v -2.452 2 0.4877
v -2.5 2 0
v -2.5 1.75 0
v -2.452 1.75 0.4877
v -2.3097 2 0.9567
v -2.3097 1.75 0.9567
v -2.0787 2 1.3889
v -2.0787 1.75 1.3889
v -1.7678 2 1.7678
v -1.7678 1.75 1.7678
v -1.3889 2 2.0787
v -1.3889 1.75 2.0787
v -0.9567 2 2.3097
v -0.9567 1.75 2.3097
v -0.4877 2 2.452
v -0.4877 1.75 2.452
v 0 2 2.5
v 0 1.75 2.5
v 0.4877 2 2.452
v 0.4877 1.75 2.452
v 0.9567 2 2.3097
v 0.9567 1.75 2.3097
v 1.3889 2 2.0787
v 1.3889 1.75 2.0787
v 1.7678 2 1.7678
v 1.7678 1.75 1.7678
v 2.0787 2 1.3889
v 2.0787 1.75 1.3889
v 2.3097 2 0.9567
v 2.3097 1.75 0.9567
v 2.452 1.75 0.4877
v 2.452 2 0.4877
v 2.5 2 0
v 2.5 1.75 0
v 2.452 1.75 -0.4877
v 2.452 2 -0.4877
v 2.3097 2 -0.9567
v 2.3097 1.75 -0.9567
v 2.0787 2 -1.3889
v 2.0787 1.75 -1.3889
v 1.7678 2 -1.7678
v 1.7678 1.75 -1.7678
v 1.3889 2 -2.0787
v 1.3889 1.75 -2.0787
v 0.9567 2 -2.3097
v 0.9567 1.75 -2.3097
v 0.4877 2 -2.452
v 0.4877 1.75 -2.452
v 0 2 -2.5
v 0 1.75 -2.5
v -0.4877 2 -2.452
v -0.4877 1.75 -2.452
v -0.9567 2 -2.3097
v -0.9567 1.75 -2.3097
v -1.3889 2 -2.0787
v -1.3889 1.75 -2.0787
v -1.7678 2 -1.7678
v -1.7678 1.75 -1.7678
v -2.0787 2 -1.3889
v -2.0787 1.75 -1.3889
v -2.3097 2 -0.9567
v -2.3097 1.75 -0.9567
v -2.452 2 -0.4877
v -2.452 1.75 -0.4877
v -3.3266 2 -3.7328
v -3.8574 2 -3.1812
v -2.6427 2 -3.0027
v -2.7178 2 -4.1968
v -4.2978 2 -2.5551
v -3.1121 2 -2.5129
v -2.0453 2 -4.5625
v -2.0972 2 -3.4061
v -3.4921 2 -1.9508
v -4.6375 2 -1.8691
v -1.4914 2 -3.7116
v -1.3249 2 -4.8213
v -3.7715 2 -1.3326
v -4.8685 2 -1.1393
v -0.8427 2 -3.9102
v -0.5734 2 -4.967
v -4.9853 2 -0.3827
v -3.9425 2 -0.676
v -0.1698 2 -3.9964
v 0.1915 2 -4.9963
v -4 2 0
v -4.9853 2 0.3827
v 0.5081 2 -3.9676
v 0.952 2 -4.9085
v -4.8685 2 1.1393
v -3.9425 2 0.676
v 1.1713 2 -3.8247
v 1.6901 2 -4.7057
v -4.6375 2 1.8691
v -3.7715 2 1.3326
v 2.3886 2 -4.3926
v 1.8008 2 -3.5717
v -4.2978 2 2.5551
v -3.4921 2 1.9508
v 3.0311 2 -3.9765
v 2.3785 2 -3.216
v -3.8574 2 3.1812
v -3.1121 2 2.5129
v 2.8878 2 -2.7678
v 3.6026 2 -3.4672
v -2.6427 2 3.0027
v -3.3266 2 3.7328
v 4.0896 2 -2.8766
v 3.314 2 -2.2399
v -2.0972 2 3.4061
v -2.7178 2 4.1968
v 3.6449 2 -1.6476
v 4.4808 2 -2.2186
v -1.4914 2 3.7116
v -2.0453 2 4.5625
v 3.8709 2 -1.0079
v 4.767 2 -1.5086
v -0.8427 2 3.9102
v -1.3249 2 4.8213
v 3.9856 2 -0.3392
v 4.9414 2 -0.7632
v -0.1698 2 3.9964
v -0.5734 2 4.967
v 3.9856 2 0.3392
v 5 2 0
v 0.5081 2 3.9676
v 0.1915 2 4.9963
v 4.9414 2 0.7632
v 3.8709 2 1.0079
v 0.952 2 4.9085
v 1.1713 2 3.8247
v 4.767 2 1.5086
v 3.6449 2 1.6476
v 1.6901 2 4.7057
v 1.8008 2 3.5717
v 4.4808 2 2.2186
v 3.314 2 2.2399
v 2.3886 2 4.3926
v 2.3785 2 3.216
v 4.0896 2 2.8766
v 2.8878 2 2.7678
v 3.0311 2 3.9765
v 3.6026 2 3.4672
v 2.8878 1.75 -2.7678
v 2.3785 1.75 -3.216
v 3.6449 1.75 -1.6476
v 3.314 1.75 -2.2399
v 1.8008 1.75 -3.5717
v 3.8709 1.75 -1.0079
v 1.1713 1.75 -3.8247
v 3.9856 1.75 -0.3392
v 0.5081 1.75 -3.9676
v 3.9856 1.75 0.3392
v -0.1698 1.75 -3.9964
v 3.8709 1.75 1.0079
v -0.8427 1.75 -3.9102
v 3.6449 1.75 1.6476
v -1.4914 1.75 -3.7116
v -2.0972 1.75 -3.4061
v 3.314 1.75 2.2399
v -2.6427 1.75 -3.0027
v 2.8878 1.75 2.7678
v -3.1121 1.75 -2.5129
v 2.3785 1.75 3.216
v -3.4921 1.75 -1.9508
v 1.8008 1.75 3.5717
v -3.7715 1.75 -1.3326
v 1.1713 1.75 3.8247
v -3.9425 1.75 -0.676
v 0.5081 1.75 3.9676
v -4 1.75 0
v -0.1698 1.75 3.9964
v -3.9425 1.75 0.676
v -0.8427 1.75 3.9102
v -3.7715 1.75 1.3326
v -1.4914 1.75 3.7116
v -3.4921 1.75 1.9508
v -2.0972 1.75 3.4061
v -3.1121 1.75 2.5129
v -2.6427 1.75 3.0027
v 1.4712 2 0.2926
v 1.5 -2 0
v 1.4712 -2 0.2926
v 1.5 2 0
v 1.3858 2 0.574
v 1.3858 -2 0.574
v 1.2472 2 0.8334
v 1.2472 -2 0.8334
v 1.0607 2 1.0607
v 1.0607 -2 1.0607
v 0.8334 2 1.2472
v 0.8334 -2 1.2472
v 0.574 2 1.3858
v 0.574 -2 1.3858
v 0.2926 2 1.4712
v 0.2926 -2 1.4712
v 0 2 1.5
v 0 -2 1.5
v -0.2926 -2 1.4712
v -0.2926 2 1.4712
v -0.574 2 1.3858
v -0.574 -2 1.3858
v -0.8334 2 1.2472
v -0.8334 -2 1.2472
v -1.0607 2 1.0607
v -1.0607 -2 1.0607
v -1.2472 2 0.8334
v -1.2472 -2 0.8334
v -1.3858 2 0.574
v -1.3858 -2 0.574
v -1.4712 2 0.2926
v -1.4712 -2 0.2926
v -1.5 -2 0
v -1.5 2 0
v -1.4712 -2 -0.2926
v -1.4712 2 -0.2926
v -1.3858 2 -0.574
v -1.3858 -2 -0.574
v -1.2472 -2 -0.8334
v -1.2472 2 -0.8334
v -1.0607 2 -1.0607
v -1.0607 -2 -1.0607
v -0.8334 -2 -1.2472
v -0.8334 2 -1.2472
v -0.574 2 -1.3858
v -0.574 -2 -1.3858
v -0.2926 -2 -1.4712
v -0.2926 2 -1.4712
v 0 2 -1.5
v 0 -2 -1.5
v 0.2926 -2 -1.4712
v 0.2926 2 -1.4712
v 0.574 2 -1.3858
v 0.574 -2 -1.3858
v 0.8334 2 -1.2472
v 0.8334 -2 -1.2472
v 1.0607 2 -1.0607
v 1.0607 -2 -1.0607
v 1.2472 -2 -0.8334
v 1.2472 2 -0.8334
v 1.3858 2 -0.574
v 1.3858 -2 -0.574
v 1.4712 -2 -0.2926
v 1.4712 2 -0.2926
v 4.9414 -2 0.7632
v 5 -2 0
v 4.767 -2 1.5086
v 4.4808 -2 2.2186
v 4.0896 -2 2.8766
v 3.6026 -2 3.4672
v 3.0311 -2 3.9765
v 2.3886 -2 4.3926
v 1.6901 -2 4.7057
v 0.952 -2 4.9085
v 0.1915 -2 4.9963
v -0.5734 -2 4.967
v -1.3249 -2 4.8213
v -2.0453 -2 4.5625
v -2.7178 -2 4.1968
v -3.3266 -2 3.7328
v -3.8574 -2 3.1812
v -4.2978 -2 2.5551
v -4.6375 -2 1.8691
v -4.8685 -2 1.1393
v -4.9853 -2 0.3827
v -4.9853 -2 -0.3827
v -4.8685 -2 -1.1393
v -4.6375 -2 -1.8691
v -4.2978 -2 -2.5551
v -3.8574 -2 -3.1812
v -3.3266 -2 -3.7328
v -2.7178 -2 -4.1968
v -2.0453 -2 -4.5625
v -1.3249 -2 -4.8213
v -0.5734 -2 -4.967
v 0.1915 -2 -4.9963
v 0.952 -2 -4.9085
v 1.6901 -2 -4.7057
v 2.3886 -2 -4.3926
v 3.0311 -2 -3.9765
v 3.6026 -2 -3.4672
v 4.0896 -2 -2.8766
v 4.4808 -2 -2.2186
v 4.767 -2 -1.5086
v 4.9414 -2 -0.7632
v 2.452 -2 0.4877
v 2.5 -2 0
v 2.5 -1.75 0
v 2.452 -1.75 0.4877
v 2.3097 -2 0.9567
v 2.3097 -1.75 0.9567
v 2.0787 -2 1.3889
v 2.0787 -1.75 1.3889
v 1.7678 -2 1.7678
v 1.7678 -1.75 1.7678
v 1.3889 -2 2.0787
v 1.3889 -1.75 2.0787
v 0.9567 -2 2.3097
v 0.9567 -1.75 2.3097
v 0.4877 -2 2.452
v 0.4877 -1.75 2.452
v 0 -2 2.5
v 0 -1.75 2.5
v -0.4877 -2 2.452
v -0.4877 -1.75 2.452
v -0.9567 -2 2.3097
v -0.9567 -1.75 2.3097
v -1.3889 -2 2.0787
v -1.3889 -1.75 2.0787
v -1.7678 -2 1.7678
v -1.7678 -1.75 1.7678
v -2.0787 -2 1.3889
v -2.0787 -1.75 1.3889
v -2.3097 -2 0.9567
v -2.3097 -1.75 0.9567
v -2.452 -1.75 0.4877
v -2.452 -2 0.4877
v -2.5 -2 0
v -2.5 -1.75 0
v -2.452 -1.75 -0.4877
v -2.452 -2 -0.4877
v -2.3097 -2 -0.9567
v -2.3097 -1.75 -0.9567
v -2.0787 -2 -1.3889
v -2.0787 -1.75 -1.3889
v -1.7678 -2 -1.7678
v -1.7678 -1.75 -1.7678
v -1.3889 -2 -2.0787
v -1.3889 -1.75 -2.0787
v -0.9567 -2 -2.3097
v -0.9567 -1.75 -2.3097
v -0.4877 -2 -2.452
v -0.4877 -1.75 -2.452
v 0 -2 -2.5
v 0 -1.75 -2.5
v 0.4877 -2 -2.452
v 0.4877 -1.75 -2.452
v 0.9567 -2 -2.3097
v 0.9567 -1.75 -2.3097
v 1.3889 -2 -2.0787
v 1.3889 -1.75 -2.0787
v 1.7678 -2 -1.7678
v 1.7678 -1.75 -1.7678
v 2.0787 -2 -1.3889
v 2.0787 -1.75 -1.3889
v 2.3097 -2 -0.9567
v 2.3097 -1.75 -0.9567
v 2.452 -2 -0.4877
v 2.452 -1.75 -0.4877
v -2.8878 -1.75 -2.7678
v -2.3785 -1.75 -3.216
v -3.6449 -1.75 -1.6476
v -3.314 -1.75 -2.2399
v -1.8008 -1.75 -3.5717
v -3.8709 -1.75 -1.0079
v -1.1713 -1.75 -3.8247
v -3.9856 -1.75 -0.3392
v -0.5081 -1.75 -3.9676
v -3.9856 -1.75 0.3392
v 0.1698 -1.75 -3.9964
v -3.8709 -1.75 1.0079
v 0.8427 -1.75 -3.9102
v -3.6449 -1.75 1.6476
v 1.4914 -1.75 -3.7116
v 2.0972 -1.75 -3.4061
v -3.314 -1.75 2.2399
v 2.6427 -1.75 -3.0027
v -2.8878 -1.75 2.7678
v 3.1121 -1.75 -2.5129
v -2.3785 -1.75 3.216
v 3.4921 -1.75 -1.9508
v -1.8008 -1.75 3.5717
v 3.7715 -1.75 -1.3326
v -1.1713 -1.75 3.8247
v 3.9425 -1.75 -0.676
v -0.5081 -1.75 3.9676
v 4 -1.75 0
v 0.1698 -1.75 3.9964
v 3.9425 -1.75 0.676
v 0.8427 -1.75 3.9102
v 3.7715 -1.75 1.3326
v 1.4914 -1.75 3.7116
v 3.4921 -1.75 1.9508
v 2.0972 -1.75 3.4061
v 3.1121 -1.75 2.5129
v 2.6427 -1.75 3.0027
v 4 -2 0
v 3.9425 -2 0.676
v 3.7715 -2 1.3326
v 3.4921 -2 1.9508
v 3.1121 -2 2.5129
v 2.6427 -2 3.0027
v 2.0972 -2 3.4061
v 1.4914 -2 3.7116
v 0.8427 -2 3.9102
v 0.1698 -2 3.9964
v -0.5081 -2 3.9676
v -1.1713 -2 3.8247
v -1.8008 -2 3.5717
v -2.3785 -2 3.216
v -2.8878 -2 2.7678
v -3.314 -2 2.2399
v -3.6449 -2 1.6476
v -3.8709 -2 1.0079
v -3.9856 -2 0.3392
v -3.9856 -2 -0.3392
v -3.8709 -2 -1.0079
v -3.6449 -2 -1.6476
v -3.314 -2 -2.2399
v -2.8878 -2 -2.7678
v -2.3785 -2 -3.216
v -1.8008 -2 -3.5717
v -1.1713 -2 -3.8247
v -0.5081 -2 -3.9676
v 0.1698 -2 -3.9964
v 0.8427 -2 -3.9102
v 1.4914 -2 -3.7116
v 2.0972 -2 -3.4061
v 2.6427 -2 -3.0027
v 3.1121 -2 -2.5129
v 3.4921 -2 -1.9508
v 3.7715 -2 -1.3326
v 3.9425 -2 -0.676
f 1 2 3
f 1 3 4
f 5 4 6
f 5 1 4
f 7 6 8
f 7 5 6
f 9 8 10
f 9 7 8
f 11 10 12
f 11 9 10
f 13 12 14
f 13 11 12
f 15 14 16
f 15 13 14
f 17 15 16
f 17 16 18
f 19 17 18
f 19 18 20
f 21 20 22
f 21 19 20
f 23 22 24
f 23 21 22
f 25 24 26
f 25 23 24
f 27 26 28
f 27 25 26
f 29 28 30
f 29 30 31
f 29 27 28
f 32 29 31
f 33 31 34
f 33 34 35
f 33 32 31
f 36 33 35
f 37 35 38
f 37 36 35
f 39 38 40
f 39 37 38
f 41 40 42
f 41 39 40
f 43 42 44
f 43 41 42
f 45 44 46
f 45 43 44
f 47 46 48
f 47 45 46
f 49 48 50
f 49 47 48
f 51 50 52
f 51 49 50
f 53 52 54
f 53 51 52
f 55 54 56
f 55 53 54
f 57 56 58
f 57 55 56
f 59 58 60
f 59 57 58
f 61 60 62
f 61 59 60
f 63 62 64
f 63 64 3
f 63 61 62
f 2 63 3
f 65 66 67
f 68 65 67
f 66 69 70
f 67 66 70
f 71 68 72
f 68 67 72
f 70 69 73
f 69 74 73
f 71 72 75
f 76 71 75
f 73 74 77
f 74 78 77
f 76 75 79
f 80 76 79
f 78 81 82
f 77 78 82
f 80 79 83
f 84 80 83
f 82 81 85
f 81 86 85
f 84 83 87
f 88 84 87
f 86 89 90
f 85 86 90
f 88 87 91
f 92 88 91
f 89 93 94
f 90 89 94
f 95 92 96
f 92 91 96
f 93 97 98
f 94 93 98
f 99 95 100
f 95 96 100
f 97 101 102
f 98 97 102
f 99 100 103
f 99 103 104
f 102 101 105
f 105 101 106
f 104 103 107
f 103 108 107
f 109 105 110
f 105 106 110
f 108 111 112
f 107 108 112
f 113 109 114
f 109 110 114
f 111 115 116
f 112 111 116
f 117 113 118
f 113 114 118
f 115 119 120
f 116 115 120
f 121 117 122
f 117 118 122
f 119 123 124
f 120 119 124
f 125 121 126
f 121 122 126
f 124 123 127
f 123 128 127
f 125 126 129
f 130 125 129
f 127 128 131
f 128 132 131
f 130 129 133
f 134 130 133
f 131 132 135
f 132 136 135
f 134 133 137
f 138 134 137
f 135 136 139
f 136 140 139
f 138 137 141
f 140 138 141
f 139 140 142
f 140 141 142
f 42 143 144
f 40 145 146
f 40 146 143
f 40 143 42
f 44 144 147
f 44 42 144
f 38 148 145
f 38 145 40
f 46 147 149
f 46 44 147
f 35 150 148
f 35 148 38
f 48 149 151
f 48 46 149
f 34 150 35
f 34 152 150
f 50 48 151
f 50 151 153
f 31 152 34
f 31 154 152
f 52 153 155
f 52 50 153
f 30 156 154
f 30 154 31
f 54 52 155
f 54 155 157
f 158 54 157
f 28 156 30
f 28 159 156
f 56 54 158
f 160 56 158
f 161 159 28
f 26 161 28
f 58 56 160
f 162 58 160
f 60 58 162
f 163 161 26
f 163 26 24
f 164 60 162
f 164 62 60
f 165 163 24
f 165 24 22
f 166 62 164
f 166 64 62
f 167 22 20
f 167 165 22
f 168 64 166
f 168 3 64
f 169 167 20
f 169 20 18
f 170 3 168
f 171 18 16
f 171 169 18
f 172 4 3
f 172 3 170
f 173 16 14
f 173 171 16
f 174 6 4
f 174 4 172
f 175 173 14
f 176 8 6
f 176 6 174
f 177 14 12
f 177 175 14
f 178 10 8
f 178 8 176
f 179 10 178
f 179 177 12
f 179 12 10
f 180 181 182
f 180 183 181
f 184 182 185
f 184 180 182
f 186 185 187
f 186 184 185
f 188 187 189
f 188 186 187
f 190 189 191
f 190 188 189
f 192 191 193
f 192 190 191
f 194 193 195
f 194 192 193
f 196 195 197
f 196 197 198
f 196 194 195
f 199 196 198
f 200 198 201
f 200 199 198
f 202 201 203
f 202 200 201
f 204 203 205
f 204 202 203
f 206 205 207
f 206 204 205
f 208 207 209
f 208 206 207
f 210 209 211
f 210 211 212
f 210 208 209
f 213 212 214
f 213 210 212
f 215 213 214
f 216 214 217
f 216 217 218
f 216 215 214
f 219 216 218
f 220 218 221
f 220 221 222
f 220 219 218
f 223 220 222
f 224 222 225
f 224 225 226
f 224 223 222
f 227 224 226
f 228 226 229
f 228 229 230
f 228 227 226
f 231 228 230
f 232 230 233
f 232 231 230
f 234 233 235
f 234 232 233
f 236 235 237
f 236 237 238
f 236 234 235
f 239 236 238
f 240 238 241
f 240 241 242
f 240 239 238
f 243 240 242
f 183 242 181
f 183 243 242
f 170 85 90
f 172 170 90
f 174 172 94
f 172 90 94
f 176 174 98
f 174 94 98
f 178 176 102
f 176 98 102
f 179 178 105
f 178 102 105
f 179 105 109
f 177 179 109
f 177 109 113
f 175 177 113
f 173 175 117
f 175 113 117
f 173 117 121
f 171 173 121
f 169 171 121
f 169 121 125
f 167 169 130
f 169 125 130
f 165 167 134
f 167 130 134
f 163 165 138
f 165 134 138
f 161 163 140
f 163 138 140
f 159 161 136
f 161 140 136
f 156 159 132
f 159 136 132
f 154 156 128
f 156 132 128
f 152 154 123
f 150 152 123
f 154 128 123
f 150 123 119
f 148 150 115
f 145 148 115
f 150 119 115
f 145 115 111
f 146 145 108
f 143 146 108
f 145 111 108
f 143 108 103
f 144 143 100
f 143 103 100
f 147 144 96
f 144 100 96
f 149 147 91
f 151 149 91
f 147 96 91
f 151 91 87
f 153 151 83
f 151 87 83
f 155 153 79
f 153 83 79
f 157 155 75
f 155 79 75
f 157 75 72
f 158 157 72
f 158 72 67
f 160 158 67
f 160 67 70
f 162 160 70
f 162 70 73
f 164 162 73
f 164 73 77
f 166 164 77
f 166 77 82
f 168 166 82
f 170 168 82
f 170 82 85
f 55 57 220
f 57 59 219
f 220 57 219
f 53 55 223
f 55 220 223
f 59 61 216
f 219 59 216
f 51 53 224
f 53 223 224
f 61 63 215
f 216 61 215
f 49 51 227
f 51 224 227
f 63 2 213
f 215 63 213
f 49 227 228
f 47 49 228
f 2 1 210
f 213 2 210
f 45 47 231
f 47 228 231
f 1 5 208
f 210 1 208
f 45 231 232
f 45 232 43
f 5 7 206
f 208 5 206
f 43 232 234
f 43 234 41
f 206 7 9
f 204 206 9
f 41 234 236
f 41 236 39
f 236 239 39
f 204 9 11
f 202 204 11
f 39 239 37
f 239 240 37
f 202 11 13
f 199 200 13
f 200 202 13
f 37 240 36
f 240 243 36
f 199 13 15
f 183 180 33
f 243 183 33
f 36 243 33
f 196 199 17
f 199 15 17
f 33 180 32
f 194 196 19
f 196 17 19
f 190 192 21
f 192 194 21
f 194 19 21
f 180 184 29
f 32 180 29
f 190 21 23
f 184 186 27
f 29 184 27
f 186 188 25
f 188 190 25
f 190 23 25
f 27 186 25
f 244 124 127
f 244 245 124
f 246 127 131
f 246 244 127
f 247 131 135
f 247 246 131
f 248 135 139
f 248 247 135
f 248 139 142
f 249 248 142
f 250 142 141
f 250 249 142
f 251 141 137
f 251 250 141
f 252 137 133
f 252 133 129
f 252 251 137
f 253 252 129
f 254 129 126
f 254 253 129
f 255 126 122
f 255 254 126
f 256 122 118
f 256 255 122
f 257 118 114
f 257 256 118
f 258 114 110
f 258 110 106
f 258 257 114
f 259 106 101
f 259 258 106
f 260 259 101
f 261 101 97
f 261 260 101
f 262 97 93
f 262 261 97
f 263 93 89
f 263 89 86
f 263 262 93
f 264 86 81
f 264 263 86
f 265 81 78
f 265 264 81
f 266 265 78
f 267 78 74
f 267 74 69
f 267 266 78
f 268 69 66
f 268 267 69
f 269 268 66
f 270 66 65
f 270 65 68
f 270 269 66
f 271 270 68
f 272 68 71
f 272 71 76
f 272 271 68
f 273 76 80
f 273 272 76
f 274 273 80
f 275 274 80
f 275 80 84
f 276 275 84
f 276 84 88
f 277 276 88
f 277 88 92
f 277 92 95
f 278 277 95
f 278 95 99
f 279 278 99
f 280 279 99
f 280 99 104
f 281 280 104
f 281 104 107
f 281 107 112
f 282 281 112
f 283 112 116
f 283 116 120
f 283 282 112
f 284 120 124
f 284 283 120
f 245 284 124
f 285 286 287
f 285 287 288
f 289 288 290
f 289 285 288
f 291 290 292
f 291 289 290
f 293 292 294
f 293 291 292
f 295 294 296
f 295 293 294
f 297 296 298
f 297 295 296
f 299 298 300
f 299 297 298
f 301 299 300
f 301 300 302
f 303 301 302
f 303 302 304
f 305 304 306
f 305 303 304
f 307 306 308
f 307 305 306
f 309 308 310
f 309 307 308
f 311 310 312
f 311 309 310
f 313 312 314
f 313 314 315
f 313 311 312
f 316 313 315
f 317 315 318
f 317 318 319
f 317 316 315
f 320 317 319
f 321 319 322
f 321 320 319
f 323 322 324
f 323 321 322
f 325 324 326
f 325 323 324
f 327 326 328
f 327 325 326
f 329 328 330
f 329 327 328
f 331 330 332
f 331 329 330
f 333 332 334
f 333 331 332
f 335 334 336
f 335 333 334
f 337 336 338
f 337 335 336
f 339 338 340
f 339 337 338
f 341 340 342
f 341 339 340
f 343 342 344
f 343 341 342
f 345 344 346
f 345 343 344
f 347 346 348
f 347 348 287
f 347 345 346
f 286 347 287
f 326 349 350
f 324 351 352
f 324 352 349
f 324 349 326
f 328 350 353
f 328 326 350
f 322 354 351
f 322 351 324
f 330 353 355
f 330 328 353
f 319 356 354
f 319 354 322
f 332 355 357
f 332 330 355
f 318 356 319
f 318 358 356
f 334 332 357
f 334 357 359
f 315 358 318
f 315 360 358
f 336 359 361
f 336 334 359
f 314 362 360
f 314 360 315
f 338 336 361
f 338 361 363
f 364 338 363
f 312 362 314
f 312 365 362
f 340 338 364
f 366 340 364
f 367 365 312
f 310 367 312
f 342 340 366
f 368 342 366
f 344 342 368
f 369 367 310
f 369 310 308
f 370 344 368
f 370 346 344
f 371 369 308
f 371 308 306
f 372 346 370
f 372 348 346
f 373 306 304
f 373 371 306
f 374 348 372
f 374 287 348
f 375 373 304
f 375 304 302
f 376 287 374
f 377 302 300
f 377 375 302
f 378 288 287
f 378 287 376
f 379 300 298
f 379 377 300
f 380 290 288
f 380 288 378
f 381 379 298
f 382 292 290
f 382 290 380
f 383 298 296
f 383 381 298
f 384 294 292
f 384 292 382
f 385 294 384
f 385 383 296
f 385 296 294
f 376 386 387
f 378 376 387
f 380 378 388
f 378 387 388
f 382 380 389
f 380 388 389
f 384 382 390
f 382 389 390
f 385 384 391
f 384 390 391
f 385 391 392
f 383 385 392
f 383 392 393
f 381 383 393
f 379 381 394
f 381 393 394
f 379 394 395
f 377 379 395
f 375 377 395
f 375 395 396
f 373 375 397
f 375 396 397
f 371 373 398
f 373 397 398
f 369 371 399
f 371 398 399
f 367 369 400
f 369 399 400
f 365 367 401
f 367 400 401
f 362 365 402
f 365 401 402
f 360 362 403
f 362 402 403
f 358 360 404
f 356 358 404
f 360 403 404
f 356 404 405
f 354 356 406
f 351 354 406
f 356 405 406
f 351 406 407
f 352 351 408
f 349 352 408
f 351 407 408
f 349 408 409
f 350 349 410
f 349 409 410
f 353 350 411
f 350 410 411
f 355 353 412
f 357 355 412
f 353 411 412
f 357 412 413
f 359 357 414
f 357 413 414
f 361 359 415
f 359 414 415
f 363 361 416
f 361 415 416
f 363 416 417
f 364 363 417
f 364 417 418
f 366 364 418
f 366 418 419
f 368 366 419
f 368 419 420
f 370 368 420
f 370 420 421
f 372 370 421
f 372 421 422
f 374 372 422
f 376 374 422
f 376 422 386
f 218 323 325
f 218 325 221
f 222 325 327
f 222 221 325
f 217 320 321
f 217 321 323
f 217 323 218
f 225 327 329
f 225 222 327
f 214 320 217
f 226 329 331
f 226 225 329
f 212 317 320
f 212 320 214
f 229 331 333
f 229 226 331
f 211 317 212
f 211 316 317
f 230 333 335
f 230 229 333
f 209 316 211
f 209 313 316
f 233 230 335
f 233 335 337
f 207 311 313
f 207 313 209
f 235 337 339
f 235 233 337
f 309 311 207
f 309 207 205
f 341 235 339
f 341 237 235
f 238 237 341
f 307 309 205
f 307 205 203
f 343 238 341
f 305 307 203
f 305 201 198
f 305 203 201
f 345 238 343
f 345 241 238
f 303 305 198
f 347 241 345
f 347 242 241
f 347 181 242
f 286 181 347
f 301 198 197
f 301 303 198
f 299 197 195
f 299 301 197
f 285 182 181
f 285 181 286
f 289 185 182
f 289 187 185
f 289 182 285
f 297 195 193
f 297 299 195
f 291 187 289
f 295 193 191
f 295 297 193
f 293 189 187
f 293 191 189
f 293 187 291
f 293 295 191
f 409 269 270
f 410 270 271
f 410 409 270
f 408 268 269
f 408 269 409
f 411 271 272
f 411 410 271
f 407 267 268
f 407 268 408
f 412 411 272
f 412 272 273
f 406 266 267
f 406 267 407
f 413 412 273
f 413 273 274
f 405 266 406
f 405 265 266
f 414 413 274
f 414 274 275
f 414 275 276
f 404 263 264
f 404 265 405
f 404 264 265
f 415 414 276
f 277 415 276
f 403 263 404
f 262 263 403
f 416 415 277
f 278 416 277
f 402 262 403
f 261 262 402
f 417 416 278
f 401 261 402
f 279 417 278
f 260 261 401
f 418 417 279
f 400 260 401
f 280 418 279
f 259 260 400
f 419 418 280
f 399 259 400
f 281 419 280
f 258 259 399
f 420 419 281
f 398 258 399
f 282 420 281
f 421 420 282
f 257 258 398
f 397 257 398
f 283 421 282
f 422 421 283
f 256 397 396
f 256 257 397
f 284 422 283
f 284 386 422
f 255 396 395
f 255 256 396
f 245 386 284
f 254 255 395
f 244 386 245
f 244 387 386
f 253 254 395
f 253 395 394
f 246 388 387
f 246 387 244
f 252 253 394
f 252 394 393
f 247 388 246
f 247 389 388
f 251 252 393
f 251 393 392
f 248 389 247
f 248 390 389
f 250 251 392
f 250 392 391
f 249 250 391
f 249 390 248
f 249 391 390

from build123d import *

# Parameters (mm, degrees)
F0_R     = 5
F0_R_2   = 1.5
F1_DEPTH = 2
F2_R     = 4
F2_R_2   = 2.5
F3_DEPTH = 0.25
F4_R     = 4
F4_R_2   = 2.5
F5_DEPTH = 0.25


with BuildPart() as f1:
    # F0 (on Front) → F1 (new body, symmetric)
    with BuildSketch(Plane.XZ):
        Circle(F0_R)
        Circle(F0_R_2, mode=Mode.SUBTRACT)
    extrude(amount=F1_DEPTH, both=True)

    # F2 (on face) → F3 (cut)
    with BuildSketch(Plane.XZ.offset(2)):
        Circle(F2_R)
        Circle(F2_R_2, mode=Mode.SUBTRACT)
    extrude(amount=-F3_DEPTH, mode=Mode.SUBTRACT)

    # F4 (on face) → F5 (cut)
    with BuildSketch(Plane(origin=(0, 2, 0), x_dir=(-1, 0, 0), z_dir=(0, 1, 0))):
        Circle(F4_R)
        Circle(F4_R_2, mode=Mode.SUBTRACT)
    extrude(amount=-F5_DEPTH, mode=Mode.SUBTRACT)


solid = f1.part
